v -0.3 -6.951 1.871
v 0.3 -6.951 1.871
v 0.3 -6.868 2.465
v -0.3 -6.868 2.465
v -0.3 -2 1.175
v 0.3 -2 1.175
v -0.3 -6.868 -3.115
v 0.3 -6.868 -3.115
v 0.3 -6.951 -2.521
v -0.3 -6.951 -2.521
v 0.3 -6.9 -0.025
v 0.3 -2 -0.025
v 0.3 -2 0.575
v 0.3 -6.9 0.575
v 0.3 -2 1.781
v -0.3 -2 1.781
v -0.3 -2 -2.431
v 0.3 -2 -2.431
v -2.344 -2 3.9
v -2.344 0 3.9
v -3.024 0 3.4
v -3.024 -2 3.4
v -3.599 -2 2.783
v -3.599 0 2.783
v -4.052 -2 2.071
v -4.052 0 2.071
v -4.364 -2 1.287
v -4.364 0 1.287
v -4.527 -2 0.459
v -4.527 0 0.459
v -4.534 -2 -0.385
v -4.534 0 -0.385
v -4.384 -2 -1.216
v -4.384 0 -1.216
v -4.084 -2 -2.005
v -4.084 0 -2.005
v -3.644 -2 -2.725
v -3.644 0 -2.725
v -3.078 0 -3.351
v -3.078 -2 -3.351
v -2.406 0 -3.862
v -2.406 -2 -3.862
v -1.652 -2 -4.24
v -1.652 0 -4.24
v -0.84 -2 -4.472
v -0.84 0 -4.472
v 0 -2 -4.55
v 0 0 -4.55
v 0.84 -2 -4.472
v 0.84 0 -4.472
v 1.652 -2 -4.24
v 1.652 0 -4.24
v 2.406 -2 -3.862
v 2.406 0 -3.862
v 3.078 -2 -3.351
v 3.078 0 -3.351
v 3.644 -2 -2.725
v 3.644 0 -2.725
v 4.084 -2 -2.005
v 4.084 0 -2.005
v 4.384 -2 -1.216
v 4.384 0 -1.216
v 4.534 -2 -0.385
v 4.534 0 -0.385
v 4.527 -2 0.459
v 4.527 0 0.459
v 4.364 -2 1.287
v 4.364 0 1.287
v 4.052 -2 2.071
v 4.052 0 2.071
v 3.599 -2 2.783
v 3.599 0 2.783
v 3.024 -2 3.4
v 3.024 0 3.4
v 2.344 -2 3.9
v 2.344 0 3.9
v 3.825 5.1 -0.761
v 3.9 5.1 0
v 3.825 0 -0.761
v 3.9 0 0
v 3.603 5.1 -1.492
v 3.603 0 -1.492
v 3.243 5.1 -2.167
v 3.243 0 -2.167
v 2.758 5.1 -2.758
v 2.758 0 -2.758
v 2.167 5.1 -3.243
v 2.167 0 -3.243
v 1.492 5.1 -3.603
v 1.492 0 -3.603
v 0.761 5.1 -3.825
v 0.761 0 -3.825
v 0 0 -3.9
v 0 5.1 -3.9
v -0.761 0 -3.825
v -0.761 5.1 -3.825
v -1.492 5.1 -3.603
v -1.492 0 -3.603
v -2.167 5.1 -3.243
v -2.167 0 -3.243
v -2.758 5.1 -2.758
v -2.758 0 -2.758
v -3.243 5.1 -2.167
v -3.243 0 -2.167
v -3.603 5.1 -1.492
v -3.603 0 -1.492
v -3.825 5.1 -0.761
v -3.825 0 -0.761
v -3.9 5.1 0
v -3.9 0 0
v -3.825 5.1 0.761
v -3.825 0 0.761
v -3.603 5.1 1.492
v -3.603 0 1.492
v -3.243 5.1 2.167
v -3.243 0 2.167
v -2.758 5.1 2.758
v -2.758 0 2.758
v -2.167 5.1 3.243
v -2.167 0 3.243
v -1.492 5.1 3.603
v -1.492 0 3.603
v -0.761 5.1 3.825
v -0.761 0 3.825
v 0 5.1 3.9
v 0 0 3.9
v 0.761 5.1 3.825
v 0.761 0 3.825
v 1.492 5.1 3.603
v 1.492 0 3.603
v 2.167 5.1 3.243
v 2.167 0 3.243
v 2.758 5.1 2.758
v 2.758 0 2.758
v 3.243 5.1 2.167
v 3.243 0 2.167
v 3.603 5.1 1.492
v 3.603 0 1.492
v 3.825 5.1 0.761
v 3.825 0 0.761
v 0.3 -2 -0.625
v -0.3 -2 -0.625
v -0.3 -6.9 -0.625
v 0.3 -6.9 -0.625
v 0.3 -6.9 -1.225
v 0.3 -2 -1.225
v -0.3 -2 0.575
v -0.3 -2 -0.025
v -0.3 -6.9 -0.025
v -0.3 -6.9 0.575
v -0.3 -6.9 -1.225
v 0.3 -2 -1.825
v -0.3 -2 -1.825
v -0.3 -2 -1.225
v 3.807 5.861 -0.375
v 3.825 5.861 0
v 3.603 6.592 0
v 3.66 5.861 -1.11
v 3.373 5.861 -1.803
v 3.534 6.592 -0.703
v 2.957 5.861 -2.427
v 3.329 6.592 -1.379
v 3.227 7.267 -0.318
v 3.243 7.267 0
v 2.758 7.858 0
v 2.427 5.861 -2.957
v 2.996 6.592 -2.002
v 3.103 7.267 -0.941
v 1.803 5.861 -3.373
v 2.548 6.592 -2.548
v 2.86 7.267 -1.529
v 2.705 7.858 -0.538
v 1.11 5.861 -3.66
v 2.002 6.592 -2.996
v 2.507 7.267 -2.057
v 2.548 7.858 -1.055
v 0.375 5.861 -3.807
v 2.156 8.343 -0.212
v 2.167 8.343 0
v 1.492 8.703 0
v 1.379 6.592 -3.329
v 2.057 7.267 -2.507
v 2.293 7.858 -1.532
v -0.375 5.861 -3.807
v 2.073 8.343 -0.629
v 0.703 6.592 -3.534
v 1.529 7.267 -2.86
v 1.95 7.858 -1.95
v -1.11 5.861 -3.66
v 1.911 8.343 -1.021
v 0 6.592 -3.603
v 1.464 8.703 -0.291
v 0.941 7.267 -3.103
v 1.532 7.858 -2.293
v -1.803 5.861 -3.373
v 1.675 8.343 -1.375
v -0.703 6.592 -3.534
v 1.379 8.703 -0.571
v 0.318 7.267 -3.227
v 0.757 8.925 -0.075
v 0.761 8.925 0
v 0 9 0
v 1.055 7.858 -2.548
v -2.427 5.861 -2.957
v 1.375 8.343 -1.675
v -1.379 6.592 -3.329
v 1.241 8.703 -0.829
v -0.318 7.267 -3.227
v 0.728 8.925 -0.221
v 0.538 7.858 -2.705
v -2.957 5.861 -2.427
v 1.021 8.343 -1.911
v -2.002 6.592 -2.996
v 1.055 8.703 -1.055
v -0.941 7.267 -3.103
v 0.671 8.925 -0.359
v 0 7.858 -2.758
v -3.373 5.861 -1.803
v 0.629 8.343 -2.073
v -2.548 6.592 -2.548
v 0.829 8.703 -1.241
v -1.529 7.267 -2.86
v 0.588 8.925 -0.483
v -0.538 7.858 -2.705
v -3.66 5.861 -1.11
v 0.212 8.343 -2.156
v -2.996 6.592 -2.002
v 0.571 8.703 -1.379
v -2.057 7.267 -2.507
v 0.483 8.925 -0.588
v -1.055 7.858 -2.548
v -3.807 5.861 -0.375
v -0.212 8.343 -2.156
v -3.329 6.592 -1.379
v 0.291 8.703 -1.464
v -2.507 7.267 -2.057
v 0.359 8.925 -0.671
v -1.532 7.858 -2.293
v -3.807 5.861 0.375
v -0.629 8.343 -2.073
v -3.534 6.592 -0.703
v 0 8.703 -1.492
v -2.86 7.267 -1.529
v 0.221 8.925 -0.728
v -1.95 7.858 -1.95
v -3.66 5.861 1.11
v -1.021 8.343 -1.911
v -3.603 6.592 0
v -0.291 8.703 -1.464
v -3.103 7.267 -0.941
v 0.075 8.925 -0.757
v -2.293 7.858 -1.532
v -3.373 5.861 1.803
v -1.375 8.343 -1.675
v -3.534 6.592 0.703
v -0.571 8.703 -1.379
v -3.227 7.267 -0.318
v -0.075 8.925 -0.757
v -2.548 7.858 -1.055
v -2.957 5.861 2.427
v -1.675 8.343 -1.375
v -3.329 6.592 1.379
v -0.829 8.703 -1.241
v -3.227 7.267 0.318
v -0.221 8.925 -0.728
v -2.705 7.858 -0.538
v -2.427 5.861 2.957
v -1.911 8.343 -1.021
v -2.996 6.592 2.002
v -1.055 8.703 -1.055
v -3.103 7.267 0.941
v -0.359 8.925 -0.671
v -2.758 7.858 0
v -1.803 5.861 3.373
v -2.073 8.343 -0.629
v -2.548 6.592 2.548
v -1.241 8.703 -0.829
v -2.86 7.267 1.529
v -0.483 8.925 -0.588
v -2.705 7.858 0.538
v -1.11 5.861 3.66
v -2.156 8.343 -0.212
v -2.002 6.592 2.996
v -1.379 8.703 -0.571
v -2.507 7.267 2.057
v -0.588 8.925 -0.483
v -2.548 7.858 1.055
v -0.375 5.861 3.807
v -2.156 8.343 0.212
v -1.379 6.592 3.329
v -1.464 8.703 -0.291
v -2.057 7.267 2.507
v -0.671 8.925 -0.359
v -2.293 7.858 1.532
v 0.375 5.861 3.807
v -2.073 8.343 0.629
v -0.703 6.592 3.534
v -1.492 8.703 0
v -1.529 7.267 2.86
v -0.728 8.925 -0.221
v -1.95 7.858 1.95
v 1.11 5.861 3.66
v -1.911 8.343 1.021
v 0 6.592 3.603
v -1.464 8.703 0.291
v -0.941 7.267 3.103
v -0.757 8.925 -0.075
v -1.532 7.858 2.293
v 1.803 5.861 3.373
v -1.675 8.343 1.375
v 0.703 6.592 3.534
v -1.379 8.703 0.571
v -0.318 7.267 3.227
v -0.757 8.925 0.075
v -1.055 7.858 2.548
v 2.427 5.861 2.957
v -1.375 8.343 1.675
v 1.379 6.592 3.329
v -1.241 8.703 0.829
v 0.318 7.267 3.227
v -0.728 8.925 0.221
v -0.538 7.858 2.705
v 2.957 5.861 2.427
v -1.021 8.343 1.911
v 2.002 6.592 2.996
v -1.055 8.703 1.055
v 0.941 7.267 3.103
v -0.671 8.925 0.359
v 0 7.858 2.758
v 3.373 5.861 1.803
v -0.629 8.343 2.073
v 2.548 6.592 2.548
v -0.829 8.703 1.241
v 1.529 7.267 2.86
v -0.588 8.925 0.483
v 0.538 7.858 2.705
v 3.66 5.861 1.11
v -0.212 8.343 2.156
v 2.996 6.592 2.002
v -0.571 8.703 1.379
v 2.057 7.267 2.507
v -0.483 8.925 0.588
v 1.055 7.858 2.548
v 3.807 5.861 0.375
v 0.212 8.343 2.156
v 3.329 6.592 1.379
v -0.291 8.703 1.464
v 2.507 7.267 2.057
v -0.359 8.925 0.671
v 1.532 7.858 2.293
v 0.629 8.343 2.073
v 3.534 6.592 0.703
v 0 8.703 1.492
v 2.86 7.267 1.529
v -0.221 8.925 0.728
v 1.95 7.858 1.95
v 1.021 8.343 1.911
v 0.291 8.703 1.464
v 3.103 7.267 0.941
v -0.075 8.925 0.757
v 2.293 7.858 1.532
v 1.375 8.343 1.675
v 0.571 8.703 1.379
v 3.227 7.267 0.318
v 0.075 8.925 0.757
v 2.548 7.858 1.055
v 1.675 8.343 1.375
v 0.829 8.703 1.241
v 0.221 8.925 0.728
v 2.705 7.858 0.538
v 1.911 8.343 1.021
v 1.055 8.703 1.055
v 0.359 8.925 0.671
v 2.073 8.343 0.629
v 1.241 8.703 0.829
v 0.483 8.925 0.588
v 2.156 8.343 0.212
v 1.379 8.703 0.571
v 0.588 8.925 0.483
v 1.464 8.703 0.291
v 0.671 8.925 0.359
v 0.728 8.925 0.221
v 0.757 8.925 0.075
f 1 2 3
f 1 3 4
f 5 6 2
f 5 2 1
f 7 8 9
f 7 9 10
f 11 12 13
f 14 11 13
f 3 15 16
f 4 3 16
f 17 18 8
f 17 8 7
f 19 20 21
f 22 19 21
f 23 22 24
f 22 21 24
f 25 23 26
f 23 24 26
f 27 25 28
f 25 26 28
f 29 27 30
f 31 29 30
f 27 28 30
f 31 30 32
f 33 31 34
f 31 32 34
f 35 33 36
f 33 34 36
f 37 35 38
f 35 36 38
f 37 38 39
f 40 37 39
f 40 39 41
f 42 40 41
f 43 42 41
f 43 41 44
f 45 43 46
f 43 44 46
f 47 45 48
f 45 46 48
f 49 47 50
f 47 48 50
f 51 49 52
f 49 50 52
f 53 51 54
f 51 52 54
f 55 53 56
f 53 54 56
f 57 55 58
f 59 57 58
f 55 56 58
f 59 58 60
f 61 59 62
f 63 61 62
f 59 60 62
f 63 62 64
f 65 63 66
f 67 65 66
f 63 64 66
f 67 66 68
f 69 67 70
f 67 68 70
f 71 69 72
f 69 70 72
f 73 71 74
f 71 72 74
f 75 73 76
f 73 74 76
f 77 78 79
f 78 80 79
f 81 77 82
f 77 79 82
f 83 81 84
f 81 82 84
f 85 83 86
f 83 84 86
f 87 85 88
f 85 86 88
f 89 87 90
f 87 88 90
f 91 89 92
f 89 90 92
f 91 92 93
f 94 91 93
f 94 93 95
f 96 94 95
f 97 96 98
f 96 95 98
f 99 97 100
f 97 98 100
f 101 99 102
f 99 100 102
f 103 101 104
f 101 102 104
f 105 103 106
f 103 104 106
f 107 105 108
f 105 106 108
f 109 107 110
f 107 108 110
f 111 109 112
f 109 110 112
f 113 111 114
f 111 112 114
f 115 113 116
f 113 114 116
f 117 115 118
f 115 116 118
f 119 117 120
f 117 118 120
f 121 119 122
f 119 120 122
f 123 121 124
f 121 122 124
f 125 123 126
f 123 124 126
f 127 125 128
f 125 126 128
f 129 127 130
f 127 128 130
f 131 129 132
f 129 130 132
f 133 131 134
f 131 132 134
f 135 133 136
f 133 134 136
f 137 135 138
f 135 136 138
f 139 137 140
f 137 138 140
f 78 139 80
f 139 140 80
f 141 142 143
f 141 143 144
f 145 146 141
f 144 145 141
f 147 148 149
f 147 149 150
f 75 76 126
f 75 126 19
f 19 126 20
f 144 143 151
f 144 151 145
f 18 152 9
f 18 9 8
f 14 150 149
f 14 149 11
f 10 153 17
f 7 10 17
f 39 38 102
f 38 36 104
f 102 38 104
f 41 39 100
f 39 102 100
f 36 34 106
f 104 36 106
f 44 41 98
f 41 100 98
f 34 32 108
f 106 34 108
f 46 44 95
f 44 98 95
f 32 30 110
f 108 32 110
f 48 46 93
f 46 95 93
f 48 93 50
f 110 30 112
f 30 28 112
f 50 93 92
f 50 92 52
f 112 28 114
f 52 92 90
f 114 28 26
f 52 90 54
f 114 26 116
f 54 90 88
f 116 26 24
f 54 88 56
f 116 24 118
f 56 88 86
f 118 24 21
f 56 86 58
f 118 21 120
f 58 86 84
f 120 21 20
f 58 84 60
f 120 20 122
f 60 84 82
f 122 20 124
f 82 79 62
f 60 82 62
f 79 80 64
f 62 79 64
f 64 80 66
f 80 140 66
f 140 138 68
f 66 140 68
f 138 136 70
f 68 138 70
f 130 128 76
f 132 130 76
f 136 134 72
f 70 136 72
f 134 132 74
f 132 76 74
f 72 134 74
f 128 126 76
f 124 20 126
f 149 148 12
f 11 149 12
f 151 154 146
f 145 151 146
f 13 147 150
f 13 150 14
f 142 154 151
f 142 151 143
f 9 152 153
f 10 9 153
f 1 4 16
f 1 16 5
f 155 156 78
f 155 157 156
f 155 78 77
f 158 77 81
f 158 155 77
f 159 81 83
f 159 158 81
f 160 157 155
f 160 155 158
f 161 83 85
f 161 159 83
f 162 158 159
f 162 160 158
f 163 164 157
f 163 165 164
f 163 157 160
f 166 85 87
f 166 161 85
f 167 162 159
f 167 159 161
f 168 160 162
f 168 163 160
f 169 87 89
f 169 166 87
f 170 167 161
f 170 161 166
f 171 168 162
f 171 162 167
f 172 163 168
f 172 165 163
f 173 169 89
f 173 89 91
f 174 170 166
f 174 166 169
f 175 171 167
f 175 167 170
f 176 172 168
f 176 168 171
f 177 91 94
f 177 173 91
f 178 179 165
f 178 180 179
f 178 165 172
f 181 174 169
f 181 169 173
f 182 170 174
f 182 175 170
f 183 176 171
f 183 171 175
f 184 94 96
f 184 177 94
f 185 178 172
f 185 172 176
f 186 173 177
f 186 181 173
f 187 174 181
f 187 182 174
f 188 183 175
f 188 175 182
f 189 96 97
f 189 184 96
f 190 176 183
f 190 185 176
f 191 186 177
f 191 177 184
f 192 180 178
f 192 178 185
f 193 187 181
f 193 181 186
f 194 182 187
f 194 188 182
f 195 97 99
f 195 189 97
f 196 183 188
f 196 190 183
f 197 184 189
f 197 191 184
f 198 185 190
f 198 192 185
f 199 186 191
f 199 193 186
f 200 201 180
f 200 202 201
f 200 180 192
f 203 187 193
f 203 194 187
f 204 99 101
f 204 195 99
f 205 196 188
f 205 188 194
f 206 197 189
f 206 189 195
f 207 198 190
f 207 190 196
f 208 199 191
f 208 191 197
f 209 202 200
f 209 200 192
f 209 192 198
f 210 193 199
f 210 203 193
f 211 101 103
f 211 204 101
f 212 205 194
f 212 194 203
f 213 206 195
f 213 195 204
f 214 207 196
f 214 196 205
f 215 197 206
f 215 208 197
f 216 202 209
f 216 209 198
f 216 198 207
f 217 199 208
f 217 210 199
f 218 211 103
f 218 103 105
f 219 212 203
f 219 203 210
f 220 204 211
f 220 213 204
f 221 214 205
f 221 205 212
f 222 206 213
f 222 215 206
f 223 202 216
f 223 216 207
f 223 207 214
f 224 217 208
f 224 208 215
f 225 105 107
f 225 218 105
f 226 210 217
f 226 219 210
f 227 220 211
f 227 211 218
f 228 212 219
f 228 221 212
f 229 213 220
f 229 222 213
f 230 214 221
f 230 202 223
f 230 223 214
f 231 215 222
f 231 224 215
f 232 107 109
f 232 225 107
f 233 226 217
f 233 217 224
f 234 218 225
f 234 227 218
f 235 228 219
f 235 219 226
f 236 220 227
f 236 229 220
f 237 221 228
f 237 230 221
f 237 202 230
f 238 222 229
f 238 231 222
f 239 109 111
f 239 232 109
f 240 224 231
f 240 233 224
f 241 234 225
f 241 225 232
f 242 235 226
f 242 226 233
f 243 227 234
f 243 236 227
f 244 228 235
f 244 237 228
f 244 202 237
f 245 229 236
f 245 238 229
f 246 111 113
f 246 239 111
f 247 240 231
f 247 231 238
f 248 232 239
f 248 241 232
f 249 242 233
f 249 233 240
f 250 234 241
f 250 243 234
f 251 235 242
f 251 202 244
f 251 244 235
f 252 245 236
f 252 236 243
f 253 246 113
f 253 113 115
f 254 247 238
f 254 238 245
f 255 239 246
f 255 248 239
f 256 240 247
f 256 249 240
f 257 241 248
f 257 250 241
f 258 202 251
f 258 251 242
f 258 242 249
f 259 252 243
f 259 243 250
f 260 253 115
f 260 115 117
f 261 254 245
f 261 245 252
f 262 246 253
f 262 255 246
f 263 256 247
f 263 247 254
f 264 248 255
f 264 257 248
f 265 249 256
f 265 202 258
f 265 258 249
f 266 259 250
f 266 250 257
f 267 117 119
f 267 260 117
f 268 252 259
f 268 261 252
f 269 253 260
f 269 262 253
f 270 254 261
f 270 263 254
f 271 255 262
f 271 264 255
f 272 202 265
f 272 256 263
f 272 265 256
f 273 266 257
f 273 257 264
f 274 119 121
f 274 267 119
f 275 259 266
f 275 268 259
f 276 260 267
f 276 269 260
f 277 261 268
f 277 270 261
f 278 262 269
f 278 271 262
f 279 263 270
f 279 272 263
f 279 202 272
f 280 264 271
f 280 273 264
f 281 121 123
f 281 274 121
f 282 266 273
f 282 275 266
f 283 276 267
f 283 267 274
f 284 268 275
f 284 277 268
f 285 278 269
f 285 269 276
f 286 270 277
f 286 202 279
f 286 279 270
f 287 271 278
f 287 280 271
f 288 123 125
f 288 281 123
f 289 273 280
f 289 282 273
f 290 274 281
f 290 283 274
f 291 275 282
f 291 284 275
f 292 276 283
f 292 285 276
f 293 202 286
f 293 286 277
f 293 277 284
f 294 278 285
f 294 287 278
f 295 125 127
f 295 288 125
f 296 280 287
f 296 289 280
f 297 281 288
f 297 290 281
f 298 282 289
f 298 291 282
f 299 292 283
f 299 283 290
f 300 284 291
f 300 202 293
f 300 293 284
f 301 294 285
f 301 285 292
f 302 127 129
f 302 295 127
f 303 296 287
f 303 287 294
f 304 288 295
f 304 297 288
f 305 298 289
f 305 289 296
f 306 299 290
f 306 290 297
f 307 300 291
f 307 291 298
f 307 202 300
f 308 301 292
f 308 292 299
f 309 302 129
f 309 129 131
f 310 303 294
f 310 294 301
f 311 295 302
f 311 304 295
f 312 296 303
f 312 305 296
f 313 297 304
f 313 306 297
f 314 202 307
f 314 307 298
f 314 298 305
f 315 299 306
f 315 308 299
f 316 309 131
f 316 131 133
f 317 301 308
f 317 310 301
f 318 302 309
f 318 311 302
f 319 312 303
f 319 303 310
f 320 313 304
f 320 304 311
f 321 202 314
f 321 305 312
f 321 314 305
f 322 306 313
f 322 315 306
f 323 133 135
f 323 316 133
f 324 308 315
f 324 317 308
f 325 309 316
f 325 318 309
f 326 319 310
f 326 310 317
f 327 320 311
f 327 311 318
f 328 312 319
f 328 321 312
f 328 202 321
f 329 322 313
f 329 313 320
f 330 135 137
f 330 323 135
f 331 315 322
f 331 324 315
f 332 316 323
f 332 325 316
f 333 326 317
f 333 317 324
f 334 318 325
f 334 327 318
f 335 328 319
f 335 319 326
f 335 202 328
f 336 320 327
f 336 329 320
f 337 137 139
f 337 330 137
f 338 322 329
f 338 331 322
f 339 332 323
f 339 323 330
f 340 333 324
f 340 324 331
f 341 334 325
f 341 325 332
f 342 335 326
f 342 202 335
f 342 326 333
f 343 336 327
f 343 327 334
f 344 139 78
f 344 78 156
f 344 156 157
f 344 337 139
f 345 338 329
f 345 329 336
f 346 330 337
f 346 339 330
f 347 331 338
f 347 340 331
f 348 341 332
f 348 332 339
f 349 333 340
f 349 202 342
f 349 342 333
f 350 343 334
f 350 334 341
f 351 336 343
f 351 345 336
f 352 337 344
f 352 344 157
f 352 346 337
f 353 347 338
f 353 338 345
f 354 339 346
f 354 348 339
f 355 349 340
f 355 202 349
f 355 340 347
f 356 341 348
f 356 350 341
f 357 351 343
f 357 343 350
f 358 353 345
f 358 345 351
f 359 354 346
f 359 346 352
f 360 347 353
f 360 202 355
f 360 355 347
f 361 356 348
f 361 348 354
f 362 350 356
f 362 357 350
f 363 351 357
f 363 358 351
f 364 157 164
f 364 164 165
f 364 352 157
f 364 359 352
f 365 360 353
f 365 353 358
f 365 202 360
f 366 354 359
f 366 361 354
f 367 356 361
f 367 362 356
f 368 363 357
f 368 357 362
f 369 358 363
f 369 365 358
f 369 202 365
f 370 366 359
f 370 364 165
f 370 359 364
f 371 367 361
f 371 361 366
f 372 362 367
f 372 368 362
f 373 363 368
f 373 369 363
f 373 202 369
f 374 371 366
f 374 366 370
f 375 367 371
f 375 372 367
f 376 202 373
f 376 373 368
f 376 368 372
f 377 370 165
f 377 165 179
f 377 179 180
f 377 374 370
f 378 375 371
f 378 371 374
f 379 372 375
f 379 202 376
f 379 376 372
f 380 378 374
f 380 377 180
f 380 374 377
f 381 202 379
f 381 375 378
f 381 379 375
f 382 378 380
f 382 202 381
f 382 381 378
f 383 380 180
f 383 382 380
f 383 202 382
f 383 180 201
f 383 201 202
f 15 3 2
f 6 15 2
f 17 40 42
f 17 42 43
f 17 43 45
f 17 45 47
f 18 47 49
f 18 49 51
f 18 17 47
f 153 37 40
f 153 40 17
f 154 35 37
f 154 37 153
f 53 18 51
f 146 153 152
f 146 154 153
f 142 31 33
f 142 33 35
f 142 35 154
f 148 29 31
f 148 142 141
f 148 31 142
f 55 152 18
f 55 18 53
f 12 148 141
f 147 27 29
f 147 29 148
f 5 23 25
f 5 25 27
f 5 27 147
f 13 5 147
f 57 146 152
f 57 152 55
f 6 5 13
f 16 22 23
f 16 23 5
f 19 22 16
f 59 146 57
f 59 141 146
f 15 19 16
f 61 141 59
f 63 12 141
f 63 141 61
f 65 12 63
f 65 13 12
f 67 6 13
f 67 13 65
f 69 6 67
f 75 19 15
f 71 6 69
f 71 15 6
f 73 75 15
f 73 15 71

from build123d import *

# Parameters (mm, degrees)
ESQUISSE1_R        = 3.9
BOSS_EXTRU_1_DEPTH = 9
CONG_1_R           = 3.9
BOSS_EXTRU_2_DEPTH = 2
ESQUISSE3_W        = 0.6
ESQUISSE3_H        = 0.6
BOSS_EXTRU_3_DEPTH = 4.9
ESQUISSE6_W        = 0.6
ESQUISSE6_H        = 0.6
BOSS_EXTRU_4_DEPTH = 5
ESQUISSE8_W        = 0.6
ESQUISSE8_H        = 0.6
BOSS_EXTRU_5_DEPTH = 5


with BuildPart() as part:
    # Esquisse1 → Boss.-Extru.1 (new body)
    with BuildSketch(Plane(origin=(0, 0, 0), x_dir=(1, 0, 0), z_dir=(0, 1, 0))):
        Circle(ESQUISSE1_R)
    extrude(amount=BOSS_EXTRU_1_DEPTH)

    # Congé1
    cong_1_edges = [part.edges().sort_by_distance(p)[0] for p in [
        (-3.9, 9, 0),
    ]]
    fillet(cong_1_edges, radius=CONG_1_R)

    # Esquisse2 → Boss.-Extru.2 (add)
    with BuildSketch(Plane.XZ):
        with BuildLine():
            Line((2.343608329, 3.9), (-2.343608329, 3.9))
            ThreePointArc((-2.343608329, 3.9), (0, -4.55), (2.343608329, 3.9))
        make_face()
    extrude(amount=BOSS_EXTRU_2_DEPTH)

    # Esquisse3 → Boss.-Extru.3 (add)
    with BuildSketch(Plane.XZ.offset(2)):
        with Locations((0, 0.275)):
            Rectangle(ESQUISSE3_W, ESQUISSE3_H)
        with Locations((0, -0.925)):
            Rectangle(ESQUISSE3_W, ESQUISSE3_H)
    extrude(amount=BOSS_EXTRU_3_DEPTH)

    # Esquisse6 → Boss.-Extru.4 (add)
    with BuildSketch(Plane(origin=(0, -2.123198642, 0.298396109), x_dir=(-1, 0, 0), z_dir=(0, -0.990268069, 0.139173101))):
        with Locations((0, -1.185218779)):
            Rectangle(ESQUISSE6_W, ESQUISSE6_H)
    extrude(amount=BOSS_EXTRU_4_DEPTH)

    # Esquisse8 → Boss.-Extru.5 (add)
    with BuildSketch(Plane(origin=(0, -2.212780783, -0.310986058), x_dir=(-1, 0, 0), z_dir=(0, -0.990268069, -0.139173101))):
        with Locations((0, 1.828893024)):
            Rectangle(ESQUISSE8_W, ESQUISSE8_H)
    extrude(amount=BOSS_EXTRU_5_DEPTH)


solid = part.part
